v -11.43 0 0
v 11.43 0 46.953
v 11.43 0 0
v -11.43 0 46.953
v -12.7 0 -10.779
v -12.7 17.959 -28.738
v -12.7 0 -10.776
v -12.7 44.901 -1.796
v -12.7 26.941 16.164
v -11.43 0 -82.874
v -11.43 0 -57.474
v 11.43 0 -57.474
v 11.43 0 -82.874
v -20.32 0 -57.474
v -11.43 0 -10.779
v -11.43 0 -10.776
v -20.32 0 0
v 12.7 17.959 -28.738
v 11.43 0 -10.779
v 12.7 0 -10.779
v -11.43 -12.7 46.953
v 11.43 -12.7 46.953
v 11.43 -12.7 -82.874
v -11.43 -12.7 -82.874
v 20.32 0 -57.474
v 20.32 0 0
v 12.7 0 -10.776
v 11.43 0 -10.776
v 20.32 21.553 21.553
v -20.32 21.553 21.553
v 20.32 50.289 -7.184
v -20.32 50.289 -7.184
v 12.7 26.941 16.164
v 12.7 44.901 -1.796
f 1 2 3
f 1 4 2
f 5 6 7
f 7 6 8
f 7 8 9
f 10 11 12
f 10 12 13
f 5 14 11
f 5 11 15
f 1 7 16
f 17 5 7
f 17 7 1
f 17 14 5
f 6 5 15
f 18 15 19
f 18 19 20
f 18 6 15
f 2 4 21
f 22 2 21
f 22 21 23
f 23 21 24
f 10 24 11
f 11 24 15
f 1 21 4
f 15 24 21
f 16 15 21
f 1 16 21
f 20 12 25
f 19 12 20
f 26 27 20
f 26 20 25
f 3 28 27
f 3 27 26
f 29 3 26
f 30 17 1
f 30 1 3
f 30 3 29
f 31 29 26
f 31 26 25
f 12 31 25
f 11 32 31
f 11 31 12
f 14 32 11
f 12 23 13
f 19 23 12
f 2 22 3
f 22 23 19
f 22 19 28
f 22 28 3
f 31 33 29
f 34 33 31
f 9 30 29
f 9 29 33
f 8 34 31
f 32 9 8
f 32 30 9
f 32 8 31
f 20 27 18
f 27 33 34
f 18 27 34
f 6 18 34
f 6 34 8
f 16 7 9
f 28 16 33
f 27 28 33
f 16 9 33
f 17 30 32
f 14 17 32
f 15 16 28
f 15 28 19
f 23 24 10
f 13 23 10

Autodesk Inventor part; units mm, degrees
ref_plane "YZ Plane" through (0, 0, 0) normal (1, 0, 0) x (0, 1, 0)
ref_plane "XZ Plane" through (0, 0, 0) normal (0, 1, 0) x (-1, 0, 0)
ref_plane "XY Plane" through (0, 0, 0) normal (0, 0, 1) x (1, 0, 0)
sketch "Sketch1" plane through (0, 0, 0) normal (1, 0, 0) x (0, 1, 0)
  line L0 (0, 0) -> (21.5526, 21.5526)
  line L1 (21.5526, 21.5526) -> (50.2894, -7.1842)
  line L2 (0, -101.8491) -> (0, 42.1347) projected
  line L3 (50.2894, -7.1842) -> (0, -57.4736)
  line L4 (0, 0) -> (0, -57.4736)
  line L5 (26.9408, 16.1645) -> (0, -10.7763) construction
  dimension "d0" = 40.64
  dimension "d1" = 45
  dimension "d5" = 7.62
  dimension "d6" = 38.1
extrude "Extrusion1" add sketch "Sketch1" along normal mid plane 40.64
sketch "Sketch2" plane through (-20.32, 21.5526, 21.5526) normal (0, 0.7071, 0.7071) x (1, 0, 0)
  line L0 (0, 0) -> (40.64, 0) construction
  line L1 (40.64, 0) -> (40.64, 40.64) construction
  line L2 (0, 0) -> (40.64, 40.64) construction
  line L3 (40.64, 40.64) -> (0, 40.64) construction
  line L4 (0, 40.64) -> (40.64, 0) construction
  line L5 (7.62, 7.62) -> (33.02, 7.62)
  line L6 (33.02, 7.62) -> (33.02, 33.02)
  line L7 (33.02, 33.02) -> (7.62, 33.02)
  line L8 (7.62, 33.02) -> (7.62, 7.62)
  line L9 (7.62, 7.62) -> (33.02, 33.02) construction
  line L10 (33.02, 7.62) -> (7.62, 33.02) construction
  point P0 (20.32, 0)
  point P1 (20.32, 20.32)
  dimension "d7" = 25.4
extrude "Extrusion2" cut sketch "Sketch2" against normal blind 38.1
sketch "Sketch3" plane through (0, 0, 0) normal (1, 0, 0) x (0, 1, 0)
  line L0 (21.5526, 21.5526) -> (0, 0) projected
  line L1 (0, 0) -> (0, -57.4736) projected
  line L2 (0, -57.4736) -> (50.2894, -7.1842) projected
  line L3 (17.9605, -28.7368) -> (0, -10.7763) projected
  line L4 (26.9408, 16.1645) -> (0, -10.7763) projected
  line L5 (0, 0) -> (0, -57.4736)
  line L6 (21.5526, 21.5526) -> (8.0019, 21.5526) construction
  line L7 (0, 0) -> (21.5526, 21.5526) projected
  line L8 (0, 0) -> (0, 46.9526)
  line L9 (50.2894, -7.1842) -> (0, -57.4736) projected
  line L10 (0, -57.4736) -> (0, -82.8736)
  line L11 (0, -137.4091) -> (0, 77.6947) projected
  line L12 (0, 46.9526) -> (-12.7, 46.9526)
  line L13 (-12.7, 46.9526) -> (-12.7, -82.8736)
  line L14 (-12.7, -82.8736) -> (0, -82.8736)
  point P0 (1.0999, -13.335)
  point P1 (0, -10.7763)
  dimension "d10" = 25.4
  dimension "d11" = 25.4
  dimension "d12" = 12.7
extrude "Extrusion3" add sketch "Sketch3" along normal mid plane 22.86
equation "\"d0\" = widthToSupportExtrusion"
equation "\"d1\" = attachementAngle"
equation "\"d6\" = insertDepth"
equation "\"d2\" = widthToSupportExtrusion"
equation "\"d7\" = extrusionSize"
equation "\"d8\" = insertDepth"
equation "\"d12\" = supportBaseDepth"
equation "\"d13\" = supportBaseWidth"
equation "\"attachementAngle\" = 45deg"
equation "\"extrusionSize\" = 25.4"
equation "\"wallThickness\" = 6.35"
equation "\"slipClearance\" = 1.27"
equation "\"insertForExtrusion\" = extrusionSize + 2 * slipClearance"
equation "\"widthToSupportExtrusion\" = insertForExtrusion + 2 * wallThickness"
equation "\"insertDepth\" = 38.1"
equation "\"supportBaseWidth\" = 22.86"
equation "\"supportBaseDepth\" = 12.7"
properties part number "45DegreeAttachementV02"
